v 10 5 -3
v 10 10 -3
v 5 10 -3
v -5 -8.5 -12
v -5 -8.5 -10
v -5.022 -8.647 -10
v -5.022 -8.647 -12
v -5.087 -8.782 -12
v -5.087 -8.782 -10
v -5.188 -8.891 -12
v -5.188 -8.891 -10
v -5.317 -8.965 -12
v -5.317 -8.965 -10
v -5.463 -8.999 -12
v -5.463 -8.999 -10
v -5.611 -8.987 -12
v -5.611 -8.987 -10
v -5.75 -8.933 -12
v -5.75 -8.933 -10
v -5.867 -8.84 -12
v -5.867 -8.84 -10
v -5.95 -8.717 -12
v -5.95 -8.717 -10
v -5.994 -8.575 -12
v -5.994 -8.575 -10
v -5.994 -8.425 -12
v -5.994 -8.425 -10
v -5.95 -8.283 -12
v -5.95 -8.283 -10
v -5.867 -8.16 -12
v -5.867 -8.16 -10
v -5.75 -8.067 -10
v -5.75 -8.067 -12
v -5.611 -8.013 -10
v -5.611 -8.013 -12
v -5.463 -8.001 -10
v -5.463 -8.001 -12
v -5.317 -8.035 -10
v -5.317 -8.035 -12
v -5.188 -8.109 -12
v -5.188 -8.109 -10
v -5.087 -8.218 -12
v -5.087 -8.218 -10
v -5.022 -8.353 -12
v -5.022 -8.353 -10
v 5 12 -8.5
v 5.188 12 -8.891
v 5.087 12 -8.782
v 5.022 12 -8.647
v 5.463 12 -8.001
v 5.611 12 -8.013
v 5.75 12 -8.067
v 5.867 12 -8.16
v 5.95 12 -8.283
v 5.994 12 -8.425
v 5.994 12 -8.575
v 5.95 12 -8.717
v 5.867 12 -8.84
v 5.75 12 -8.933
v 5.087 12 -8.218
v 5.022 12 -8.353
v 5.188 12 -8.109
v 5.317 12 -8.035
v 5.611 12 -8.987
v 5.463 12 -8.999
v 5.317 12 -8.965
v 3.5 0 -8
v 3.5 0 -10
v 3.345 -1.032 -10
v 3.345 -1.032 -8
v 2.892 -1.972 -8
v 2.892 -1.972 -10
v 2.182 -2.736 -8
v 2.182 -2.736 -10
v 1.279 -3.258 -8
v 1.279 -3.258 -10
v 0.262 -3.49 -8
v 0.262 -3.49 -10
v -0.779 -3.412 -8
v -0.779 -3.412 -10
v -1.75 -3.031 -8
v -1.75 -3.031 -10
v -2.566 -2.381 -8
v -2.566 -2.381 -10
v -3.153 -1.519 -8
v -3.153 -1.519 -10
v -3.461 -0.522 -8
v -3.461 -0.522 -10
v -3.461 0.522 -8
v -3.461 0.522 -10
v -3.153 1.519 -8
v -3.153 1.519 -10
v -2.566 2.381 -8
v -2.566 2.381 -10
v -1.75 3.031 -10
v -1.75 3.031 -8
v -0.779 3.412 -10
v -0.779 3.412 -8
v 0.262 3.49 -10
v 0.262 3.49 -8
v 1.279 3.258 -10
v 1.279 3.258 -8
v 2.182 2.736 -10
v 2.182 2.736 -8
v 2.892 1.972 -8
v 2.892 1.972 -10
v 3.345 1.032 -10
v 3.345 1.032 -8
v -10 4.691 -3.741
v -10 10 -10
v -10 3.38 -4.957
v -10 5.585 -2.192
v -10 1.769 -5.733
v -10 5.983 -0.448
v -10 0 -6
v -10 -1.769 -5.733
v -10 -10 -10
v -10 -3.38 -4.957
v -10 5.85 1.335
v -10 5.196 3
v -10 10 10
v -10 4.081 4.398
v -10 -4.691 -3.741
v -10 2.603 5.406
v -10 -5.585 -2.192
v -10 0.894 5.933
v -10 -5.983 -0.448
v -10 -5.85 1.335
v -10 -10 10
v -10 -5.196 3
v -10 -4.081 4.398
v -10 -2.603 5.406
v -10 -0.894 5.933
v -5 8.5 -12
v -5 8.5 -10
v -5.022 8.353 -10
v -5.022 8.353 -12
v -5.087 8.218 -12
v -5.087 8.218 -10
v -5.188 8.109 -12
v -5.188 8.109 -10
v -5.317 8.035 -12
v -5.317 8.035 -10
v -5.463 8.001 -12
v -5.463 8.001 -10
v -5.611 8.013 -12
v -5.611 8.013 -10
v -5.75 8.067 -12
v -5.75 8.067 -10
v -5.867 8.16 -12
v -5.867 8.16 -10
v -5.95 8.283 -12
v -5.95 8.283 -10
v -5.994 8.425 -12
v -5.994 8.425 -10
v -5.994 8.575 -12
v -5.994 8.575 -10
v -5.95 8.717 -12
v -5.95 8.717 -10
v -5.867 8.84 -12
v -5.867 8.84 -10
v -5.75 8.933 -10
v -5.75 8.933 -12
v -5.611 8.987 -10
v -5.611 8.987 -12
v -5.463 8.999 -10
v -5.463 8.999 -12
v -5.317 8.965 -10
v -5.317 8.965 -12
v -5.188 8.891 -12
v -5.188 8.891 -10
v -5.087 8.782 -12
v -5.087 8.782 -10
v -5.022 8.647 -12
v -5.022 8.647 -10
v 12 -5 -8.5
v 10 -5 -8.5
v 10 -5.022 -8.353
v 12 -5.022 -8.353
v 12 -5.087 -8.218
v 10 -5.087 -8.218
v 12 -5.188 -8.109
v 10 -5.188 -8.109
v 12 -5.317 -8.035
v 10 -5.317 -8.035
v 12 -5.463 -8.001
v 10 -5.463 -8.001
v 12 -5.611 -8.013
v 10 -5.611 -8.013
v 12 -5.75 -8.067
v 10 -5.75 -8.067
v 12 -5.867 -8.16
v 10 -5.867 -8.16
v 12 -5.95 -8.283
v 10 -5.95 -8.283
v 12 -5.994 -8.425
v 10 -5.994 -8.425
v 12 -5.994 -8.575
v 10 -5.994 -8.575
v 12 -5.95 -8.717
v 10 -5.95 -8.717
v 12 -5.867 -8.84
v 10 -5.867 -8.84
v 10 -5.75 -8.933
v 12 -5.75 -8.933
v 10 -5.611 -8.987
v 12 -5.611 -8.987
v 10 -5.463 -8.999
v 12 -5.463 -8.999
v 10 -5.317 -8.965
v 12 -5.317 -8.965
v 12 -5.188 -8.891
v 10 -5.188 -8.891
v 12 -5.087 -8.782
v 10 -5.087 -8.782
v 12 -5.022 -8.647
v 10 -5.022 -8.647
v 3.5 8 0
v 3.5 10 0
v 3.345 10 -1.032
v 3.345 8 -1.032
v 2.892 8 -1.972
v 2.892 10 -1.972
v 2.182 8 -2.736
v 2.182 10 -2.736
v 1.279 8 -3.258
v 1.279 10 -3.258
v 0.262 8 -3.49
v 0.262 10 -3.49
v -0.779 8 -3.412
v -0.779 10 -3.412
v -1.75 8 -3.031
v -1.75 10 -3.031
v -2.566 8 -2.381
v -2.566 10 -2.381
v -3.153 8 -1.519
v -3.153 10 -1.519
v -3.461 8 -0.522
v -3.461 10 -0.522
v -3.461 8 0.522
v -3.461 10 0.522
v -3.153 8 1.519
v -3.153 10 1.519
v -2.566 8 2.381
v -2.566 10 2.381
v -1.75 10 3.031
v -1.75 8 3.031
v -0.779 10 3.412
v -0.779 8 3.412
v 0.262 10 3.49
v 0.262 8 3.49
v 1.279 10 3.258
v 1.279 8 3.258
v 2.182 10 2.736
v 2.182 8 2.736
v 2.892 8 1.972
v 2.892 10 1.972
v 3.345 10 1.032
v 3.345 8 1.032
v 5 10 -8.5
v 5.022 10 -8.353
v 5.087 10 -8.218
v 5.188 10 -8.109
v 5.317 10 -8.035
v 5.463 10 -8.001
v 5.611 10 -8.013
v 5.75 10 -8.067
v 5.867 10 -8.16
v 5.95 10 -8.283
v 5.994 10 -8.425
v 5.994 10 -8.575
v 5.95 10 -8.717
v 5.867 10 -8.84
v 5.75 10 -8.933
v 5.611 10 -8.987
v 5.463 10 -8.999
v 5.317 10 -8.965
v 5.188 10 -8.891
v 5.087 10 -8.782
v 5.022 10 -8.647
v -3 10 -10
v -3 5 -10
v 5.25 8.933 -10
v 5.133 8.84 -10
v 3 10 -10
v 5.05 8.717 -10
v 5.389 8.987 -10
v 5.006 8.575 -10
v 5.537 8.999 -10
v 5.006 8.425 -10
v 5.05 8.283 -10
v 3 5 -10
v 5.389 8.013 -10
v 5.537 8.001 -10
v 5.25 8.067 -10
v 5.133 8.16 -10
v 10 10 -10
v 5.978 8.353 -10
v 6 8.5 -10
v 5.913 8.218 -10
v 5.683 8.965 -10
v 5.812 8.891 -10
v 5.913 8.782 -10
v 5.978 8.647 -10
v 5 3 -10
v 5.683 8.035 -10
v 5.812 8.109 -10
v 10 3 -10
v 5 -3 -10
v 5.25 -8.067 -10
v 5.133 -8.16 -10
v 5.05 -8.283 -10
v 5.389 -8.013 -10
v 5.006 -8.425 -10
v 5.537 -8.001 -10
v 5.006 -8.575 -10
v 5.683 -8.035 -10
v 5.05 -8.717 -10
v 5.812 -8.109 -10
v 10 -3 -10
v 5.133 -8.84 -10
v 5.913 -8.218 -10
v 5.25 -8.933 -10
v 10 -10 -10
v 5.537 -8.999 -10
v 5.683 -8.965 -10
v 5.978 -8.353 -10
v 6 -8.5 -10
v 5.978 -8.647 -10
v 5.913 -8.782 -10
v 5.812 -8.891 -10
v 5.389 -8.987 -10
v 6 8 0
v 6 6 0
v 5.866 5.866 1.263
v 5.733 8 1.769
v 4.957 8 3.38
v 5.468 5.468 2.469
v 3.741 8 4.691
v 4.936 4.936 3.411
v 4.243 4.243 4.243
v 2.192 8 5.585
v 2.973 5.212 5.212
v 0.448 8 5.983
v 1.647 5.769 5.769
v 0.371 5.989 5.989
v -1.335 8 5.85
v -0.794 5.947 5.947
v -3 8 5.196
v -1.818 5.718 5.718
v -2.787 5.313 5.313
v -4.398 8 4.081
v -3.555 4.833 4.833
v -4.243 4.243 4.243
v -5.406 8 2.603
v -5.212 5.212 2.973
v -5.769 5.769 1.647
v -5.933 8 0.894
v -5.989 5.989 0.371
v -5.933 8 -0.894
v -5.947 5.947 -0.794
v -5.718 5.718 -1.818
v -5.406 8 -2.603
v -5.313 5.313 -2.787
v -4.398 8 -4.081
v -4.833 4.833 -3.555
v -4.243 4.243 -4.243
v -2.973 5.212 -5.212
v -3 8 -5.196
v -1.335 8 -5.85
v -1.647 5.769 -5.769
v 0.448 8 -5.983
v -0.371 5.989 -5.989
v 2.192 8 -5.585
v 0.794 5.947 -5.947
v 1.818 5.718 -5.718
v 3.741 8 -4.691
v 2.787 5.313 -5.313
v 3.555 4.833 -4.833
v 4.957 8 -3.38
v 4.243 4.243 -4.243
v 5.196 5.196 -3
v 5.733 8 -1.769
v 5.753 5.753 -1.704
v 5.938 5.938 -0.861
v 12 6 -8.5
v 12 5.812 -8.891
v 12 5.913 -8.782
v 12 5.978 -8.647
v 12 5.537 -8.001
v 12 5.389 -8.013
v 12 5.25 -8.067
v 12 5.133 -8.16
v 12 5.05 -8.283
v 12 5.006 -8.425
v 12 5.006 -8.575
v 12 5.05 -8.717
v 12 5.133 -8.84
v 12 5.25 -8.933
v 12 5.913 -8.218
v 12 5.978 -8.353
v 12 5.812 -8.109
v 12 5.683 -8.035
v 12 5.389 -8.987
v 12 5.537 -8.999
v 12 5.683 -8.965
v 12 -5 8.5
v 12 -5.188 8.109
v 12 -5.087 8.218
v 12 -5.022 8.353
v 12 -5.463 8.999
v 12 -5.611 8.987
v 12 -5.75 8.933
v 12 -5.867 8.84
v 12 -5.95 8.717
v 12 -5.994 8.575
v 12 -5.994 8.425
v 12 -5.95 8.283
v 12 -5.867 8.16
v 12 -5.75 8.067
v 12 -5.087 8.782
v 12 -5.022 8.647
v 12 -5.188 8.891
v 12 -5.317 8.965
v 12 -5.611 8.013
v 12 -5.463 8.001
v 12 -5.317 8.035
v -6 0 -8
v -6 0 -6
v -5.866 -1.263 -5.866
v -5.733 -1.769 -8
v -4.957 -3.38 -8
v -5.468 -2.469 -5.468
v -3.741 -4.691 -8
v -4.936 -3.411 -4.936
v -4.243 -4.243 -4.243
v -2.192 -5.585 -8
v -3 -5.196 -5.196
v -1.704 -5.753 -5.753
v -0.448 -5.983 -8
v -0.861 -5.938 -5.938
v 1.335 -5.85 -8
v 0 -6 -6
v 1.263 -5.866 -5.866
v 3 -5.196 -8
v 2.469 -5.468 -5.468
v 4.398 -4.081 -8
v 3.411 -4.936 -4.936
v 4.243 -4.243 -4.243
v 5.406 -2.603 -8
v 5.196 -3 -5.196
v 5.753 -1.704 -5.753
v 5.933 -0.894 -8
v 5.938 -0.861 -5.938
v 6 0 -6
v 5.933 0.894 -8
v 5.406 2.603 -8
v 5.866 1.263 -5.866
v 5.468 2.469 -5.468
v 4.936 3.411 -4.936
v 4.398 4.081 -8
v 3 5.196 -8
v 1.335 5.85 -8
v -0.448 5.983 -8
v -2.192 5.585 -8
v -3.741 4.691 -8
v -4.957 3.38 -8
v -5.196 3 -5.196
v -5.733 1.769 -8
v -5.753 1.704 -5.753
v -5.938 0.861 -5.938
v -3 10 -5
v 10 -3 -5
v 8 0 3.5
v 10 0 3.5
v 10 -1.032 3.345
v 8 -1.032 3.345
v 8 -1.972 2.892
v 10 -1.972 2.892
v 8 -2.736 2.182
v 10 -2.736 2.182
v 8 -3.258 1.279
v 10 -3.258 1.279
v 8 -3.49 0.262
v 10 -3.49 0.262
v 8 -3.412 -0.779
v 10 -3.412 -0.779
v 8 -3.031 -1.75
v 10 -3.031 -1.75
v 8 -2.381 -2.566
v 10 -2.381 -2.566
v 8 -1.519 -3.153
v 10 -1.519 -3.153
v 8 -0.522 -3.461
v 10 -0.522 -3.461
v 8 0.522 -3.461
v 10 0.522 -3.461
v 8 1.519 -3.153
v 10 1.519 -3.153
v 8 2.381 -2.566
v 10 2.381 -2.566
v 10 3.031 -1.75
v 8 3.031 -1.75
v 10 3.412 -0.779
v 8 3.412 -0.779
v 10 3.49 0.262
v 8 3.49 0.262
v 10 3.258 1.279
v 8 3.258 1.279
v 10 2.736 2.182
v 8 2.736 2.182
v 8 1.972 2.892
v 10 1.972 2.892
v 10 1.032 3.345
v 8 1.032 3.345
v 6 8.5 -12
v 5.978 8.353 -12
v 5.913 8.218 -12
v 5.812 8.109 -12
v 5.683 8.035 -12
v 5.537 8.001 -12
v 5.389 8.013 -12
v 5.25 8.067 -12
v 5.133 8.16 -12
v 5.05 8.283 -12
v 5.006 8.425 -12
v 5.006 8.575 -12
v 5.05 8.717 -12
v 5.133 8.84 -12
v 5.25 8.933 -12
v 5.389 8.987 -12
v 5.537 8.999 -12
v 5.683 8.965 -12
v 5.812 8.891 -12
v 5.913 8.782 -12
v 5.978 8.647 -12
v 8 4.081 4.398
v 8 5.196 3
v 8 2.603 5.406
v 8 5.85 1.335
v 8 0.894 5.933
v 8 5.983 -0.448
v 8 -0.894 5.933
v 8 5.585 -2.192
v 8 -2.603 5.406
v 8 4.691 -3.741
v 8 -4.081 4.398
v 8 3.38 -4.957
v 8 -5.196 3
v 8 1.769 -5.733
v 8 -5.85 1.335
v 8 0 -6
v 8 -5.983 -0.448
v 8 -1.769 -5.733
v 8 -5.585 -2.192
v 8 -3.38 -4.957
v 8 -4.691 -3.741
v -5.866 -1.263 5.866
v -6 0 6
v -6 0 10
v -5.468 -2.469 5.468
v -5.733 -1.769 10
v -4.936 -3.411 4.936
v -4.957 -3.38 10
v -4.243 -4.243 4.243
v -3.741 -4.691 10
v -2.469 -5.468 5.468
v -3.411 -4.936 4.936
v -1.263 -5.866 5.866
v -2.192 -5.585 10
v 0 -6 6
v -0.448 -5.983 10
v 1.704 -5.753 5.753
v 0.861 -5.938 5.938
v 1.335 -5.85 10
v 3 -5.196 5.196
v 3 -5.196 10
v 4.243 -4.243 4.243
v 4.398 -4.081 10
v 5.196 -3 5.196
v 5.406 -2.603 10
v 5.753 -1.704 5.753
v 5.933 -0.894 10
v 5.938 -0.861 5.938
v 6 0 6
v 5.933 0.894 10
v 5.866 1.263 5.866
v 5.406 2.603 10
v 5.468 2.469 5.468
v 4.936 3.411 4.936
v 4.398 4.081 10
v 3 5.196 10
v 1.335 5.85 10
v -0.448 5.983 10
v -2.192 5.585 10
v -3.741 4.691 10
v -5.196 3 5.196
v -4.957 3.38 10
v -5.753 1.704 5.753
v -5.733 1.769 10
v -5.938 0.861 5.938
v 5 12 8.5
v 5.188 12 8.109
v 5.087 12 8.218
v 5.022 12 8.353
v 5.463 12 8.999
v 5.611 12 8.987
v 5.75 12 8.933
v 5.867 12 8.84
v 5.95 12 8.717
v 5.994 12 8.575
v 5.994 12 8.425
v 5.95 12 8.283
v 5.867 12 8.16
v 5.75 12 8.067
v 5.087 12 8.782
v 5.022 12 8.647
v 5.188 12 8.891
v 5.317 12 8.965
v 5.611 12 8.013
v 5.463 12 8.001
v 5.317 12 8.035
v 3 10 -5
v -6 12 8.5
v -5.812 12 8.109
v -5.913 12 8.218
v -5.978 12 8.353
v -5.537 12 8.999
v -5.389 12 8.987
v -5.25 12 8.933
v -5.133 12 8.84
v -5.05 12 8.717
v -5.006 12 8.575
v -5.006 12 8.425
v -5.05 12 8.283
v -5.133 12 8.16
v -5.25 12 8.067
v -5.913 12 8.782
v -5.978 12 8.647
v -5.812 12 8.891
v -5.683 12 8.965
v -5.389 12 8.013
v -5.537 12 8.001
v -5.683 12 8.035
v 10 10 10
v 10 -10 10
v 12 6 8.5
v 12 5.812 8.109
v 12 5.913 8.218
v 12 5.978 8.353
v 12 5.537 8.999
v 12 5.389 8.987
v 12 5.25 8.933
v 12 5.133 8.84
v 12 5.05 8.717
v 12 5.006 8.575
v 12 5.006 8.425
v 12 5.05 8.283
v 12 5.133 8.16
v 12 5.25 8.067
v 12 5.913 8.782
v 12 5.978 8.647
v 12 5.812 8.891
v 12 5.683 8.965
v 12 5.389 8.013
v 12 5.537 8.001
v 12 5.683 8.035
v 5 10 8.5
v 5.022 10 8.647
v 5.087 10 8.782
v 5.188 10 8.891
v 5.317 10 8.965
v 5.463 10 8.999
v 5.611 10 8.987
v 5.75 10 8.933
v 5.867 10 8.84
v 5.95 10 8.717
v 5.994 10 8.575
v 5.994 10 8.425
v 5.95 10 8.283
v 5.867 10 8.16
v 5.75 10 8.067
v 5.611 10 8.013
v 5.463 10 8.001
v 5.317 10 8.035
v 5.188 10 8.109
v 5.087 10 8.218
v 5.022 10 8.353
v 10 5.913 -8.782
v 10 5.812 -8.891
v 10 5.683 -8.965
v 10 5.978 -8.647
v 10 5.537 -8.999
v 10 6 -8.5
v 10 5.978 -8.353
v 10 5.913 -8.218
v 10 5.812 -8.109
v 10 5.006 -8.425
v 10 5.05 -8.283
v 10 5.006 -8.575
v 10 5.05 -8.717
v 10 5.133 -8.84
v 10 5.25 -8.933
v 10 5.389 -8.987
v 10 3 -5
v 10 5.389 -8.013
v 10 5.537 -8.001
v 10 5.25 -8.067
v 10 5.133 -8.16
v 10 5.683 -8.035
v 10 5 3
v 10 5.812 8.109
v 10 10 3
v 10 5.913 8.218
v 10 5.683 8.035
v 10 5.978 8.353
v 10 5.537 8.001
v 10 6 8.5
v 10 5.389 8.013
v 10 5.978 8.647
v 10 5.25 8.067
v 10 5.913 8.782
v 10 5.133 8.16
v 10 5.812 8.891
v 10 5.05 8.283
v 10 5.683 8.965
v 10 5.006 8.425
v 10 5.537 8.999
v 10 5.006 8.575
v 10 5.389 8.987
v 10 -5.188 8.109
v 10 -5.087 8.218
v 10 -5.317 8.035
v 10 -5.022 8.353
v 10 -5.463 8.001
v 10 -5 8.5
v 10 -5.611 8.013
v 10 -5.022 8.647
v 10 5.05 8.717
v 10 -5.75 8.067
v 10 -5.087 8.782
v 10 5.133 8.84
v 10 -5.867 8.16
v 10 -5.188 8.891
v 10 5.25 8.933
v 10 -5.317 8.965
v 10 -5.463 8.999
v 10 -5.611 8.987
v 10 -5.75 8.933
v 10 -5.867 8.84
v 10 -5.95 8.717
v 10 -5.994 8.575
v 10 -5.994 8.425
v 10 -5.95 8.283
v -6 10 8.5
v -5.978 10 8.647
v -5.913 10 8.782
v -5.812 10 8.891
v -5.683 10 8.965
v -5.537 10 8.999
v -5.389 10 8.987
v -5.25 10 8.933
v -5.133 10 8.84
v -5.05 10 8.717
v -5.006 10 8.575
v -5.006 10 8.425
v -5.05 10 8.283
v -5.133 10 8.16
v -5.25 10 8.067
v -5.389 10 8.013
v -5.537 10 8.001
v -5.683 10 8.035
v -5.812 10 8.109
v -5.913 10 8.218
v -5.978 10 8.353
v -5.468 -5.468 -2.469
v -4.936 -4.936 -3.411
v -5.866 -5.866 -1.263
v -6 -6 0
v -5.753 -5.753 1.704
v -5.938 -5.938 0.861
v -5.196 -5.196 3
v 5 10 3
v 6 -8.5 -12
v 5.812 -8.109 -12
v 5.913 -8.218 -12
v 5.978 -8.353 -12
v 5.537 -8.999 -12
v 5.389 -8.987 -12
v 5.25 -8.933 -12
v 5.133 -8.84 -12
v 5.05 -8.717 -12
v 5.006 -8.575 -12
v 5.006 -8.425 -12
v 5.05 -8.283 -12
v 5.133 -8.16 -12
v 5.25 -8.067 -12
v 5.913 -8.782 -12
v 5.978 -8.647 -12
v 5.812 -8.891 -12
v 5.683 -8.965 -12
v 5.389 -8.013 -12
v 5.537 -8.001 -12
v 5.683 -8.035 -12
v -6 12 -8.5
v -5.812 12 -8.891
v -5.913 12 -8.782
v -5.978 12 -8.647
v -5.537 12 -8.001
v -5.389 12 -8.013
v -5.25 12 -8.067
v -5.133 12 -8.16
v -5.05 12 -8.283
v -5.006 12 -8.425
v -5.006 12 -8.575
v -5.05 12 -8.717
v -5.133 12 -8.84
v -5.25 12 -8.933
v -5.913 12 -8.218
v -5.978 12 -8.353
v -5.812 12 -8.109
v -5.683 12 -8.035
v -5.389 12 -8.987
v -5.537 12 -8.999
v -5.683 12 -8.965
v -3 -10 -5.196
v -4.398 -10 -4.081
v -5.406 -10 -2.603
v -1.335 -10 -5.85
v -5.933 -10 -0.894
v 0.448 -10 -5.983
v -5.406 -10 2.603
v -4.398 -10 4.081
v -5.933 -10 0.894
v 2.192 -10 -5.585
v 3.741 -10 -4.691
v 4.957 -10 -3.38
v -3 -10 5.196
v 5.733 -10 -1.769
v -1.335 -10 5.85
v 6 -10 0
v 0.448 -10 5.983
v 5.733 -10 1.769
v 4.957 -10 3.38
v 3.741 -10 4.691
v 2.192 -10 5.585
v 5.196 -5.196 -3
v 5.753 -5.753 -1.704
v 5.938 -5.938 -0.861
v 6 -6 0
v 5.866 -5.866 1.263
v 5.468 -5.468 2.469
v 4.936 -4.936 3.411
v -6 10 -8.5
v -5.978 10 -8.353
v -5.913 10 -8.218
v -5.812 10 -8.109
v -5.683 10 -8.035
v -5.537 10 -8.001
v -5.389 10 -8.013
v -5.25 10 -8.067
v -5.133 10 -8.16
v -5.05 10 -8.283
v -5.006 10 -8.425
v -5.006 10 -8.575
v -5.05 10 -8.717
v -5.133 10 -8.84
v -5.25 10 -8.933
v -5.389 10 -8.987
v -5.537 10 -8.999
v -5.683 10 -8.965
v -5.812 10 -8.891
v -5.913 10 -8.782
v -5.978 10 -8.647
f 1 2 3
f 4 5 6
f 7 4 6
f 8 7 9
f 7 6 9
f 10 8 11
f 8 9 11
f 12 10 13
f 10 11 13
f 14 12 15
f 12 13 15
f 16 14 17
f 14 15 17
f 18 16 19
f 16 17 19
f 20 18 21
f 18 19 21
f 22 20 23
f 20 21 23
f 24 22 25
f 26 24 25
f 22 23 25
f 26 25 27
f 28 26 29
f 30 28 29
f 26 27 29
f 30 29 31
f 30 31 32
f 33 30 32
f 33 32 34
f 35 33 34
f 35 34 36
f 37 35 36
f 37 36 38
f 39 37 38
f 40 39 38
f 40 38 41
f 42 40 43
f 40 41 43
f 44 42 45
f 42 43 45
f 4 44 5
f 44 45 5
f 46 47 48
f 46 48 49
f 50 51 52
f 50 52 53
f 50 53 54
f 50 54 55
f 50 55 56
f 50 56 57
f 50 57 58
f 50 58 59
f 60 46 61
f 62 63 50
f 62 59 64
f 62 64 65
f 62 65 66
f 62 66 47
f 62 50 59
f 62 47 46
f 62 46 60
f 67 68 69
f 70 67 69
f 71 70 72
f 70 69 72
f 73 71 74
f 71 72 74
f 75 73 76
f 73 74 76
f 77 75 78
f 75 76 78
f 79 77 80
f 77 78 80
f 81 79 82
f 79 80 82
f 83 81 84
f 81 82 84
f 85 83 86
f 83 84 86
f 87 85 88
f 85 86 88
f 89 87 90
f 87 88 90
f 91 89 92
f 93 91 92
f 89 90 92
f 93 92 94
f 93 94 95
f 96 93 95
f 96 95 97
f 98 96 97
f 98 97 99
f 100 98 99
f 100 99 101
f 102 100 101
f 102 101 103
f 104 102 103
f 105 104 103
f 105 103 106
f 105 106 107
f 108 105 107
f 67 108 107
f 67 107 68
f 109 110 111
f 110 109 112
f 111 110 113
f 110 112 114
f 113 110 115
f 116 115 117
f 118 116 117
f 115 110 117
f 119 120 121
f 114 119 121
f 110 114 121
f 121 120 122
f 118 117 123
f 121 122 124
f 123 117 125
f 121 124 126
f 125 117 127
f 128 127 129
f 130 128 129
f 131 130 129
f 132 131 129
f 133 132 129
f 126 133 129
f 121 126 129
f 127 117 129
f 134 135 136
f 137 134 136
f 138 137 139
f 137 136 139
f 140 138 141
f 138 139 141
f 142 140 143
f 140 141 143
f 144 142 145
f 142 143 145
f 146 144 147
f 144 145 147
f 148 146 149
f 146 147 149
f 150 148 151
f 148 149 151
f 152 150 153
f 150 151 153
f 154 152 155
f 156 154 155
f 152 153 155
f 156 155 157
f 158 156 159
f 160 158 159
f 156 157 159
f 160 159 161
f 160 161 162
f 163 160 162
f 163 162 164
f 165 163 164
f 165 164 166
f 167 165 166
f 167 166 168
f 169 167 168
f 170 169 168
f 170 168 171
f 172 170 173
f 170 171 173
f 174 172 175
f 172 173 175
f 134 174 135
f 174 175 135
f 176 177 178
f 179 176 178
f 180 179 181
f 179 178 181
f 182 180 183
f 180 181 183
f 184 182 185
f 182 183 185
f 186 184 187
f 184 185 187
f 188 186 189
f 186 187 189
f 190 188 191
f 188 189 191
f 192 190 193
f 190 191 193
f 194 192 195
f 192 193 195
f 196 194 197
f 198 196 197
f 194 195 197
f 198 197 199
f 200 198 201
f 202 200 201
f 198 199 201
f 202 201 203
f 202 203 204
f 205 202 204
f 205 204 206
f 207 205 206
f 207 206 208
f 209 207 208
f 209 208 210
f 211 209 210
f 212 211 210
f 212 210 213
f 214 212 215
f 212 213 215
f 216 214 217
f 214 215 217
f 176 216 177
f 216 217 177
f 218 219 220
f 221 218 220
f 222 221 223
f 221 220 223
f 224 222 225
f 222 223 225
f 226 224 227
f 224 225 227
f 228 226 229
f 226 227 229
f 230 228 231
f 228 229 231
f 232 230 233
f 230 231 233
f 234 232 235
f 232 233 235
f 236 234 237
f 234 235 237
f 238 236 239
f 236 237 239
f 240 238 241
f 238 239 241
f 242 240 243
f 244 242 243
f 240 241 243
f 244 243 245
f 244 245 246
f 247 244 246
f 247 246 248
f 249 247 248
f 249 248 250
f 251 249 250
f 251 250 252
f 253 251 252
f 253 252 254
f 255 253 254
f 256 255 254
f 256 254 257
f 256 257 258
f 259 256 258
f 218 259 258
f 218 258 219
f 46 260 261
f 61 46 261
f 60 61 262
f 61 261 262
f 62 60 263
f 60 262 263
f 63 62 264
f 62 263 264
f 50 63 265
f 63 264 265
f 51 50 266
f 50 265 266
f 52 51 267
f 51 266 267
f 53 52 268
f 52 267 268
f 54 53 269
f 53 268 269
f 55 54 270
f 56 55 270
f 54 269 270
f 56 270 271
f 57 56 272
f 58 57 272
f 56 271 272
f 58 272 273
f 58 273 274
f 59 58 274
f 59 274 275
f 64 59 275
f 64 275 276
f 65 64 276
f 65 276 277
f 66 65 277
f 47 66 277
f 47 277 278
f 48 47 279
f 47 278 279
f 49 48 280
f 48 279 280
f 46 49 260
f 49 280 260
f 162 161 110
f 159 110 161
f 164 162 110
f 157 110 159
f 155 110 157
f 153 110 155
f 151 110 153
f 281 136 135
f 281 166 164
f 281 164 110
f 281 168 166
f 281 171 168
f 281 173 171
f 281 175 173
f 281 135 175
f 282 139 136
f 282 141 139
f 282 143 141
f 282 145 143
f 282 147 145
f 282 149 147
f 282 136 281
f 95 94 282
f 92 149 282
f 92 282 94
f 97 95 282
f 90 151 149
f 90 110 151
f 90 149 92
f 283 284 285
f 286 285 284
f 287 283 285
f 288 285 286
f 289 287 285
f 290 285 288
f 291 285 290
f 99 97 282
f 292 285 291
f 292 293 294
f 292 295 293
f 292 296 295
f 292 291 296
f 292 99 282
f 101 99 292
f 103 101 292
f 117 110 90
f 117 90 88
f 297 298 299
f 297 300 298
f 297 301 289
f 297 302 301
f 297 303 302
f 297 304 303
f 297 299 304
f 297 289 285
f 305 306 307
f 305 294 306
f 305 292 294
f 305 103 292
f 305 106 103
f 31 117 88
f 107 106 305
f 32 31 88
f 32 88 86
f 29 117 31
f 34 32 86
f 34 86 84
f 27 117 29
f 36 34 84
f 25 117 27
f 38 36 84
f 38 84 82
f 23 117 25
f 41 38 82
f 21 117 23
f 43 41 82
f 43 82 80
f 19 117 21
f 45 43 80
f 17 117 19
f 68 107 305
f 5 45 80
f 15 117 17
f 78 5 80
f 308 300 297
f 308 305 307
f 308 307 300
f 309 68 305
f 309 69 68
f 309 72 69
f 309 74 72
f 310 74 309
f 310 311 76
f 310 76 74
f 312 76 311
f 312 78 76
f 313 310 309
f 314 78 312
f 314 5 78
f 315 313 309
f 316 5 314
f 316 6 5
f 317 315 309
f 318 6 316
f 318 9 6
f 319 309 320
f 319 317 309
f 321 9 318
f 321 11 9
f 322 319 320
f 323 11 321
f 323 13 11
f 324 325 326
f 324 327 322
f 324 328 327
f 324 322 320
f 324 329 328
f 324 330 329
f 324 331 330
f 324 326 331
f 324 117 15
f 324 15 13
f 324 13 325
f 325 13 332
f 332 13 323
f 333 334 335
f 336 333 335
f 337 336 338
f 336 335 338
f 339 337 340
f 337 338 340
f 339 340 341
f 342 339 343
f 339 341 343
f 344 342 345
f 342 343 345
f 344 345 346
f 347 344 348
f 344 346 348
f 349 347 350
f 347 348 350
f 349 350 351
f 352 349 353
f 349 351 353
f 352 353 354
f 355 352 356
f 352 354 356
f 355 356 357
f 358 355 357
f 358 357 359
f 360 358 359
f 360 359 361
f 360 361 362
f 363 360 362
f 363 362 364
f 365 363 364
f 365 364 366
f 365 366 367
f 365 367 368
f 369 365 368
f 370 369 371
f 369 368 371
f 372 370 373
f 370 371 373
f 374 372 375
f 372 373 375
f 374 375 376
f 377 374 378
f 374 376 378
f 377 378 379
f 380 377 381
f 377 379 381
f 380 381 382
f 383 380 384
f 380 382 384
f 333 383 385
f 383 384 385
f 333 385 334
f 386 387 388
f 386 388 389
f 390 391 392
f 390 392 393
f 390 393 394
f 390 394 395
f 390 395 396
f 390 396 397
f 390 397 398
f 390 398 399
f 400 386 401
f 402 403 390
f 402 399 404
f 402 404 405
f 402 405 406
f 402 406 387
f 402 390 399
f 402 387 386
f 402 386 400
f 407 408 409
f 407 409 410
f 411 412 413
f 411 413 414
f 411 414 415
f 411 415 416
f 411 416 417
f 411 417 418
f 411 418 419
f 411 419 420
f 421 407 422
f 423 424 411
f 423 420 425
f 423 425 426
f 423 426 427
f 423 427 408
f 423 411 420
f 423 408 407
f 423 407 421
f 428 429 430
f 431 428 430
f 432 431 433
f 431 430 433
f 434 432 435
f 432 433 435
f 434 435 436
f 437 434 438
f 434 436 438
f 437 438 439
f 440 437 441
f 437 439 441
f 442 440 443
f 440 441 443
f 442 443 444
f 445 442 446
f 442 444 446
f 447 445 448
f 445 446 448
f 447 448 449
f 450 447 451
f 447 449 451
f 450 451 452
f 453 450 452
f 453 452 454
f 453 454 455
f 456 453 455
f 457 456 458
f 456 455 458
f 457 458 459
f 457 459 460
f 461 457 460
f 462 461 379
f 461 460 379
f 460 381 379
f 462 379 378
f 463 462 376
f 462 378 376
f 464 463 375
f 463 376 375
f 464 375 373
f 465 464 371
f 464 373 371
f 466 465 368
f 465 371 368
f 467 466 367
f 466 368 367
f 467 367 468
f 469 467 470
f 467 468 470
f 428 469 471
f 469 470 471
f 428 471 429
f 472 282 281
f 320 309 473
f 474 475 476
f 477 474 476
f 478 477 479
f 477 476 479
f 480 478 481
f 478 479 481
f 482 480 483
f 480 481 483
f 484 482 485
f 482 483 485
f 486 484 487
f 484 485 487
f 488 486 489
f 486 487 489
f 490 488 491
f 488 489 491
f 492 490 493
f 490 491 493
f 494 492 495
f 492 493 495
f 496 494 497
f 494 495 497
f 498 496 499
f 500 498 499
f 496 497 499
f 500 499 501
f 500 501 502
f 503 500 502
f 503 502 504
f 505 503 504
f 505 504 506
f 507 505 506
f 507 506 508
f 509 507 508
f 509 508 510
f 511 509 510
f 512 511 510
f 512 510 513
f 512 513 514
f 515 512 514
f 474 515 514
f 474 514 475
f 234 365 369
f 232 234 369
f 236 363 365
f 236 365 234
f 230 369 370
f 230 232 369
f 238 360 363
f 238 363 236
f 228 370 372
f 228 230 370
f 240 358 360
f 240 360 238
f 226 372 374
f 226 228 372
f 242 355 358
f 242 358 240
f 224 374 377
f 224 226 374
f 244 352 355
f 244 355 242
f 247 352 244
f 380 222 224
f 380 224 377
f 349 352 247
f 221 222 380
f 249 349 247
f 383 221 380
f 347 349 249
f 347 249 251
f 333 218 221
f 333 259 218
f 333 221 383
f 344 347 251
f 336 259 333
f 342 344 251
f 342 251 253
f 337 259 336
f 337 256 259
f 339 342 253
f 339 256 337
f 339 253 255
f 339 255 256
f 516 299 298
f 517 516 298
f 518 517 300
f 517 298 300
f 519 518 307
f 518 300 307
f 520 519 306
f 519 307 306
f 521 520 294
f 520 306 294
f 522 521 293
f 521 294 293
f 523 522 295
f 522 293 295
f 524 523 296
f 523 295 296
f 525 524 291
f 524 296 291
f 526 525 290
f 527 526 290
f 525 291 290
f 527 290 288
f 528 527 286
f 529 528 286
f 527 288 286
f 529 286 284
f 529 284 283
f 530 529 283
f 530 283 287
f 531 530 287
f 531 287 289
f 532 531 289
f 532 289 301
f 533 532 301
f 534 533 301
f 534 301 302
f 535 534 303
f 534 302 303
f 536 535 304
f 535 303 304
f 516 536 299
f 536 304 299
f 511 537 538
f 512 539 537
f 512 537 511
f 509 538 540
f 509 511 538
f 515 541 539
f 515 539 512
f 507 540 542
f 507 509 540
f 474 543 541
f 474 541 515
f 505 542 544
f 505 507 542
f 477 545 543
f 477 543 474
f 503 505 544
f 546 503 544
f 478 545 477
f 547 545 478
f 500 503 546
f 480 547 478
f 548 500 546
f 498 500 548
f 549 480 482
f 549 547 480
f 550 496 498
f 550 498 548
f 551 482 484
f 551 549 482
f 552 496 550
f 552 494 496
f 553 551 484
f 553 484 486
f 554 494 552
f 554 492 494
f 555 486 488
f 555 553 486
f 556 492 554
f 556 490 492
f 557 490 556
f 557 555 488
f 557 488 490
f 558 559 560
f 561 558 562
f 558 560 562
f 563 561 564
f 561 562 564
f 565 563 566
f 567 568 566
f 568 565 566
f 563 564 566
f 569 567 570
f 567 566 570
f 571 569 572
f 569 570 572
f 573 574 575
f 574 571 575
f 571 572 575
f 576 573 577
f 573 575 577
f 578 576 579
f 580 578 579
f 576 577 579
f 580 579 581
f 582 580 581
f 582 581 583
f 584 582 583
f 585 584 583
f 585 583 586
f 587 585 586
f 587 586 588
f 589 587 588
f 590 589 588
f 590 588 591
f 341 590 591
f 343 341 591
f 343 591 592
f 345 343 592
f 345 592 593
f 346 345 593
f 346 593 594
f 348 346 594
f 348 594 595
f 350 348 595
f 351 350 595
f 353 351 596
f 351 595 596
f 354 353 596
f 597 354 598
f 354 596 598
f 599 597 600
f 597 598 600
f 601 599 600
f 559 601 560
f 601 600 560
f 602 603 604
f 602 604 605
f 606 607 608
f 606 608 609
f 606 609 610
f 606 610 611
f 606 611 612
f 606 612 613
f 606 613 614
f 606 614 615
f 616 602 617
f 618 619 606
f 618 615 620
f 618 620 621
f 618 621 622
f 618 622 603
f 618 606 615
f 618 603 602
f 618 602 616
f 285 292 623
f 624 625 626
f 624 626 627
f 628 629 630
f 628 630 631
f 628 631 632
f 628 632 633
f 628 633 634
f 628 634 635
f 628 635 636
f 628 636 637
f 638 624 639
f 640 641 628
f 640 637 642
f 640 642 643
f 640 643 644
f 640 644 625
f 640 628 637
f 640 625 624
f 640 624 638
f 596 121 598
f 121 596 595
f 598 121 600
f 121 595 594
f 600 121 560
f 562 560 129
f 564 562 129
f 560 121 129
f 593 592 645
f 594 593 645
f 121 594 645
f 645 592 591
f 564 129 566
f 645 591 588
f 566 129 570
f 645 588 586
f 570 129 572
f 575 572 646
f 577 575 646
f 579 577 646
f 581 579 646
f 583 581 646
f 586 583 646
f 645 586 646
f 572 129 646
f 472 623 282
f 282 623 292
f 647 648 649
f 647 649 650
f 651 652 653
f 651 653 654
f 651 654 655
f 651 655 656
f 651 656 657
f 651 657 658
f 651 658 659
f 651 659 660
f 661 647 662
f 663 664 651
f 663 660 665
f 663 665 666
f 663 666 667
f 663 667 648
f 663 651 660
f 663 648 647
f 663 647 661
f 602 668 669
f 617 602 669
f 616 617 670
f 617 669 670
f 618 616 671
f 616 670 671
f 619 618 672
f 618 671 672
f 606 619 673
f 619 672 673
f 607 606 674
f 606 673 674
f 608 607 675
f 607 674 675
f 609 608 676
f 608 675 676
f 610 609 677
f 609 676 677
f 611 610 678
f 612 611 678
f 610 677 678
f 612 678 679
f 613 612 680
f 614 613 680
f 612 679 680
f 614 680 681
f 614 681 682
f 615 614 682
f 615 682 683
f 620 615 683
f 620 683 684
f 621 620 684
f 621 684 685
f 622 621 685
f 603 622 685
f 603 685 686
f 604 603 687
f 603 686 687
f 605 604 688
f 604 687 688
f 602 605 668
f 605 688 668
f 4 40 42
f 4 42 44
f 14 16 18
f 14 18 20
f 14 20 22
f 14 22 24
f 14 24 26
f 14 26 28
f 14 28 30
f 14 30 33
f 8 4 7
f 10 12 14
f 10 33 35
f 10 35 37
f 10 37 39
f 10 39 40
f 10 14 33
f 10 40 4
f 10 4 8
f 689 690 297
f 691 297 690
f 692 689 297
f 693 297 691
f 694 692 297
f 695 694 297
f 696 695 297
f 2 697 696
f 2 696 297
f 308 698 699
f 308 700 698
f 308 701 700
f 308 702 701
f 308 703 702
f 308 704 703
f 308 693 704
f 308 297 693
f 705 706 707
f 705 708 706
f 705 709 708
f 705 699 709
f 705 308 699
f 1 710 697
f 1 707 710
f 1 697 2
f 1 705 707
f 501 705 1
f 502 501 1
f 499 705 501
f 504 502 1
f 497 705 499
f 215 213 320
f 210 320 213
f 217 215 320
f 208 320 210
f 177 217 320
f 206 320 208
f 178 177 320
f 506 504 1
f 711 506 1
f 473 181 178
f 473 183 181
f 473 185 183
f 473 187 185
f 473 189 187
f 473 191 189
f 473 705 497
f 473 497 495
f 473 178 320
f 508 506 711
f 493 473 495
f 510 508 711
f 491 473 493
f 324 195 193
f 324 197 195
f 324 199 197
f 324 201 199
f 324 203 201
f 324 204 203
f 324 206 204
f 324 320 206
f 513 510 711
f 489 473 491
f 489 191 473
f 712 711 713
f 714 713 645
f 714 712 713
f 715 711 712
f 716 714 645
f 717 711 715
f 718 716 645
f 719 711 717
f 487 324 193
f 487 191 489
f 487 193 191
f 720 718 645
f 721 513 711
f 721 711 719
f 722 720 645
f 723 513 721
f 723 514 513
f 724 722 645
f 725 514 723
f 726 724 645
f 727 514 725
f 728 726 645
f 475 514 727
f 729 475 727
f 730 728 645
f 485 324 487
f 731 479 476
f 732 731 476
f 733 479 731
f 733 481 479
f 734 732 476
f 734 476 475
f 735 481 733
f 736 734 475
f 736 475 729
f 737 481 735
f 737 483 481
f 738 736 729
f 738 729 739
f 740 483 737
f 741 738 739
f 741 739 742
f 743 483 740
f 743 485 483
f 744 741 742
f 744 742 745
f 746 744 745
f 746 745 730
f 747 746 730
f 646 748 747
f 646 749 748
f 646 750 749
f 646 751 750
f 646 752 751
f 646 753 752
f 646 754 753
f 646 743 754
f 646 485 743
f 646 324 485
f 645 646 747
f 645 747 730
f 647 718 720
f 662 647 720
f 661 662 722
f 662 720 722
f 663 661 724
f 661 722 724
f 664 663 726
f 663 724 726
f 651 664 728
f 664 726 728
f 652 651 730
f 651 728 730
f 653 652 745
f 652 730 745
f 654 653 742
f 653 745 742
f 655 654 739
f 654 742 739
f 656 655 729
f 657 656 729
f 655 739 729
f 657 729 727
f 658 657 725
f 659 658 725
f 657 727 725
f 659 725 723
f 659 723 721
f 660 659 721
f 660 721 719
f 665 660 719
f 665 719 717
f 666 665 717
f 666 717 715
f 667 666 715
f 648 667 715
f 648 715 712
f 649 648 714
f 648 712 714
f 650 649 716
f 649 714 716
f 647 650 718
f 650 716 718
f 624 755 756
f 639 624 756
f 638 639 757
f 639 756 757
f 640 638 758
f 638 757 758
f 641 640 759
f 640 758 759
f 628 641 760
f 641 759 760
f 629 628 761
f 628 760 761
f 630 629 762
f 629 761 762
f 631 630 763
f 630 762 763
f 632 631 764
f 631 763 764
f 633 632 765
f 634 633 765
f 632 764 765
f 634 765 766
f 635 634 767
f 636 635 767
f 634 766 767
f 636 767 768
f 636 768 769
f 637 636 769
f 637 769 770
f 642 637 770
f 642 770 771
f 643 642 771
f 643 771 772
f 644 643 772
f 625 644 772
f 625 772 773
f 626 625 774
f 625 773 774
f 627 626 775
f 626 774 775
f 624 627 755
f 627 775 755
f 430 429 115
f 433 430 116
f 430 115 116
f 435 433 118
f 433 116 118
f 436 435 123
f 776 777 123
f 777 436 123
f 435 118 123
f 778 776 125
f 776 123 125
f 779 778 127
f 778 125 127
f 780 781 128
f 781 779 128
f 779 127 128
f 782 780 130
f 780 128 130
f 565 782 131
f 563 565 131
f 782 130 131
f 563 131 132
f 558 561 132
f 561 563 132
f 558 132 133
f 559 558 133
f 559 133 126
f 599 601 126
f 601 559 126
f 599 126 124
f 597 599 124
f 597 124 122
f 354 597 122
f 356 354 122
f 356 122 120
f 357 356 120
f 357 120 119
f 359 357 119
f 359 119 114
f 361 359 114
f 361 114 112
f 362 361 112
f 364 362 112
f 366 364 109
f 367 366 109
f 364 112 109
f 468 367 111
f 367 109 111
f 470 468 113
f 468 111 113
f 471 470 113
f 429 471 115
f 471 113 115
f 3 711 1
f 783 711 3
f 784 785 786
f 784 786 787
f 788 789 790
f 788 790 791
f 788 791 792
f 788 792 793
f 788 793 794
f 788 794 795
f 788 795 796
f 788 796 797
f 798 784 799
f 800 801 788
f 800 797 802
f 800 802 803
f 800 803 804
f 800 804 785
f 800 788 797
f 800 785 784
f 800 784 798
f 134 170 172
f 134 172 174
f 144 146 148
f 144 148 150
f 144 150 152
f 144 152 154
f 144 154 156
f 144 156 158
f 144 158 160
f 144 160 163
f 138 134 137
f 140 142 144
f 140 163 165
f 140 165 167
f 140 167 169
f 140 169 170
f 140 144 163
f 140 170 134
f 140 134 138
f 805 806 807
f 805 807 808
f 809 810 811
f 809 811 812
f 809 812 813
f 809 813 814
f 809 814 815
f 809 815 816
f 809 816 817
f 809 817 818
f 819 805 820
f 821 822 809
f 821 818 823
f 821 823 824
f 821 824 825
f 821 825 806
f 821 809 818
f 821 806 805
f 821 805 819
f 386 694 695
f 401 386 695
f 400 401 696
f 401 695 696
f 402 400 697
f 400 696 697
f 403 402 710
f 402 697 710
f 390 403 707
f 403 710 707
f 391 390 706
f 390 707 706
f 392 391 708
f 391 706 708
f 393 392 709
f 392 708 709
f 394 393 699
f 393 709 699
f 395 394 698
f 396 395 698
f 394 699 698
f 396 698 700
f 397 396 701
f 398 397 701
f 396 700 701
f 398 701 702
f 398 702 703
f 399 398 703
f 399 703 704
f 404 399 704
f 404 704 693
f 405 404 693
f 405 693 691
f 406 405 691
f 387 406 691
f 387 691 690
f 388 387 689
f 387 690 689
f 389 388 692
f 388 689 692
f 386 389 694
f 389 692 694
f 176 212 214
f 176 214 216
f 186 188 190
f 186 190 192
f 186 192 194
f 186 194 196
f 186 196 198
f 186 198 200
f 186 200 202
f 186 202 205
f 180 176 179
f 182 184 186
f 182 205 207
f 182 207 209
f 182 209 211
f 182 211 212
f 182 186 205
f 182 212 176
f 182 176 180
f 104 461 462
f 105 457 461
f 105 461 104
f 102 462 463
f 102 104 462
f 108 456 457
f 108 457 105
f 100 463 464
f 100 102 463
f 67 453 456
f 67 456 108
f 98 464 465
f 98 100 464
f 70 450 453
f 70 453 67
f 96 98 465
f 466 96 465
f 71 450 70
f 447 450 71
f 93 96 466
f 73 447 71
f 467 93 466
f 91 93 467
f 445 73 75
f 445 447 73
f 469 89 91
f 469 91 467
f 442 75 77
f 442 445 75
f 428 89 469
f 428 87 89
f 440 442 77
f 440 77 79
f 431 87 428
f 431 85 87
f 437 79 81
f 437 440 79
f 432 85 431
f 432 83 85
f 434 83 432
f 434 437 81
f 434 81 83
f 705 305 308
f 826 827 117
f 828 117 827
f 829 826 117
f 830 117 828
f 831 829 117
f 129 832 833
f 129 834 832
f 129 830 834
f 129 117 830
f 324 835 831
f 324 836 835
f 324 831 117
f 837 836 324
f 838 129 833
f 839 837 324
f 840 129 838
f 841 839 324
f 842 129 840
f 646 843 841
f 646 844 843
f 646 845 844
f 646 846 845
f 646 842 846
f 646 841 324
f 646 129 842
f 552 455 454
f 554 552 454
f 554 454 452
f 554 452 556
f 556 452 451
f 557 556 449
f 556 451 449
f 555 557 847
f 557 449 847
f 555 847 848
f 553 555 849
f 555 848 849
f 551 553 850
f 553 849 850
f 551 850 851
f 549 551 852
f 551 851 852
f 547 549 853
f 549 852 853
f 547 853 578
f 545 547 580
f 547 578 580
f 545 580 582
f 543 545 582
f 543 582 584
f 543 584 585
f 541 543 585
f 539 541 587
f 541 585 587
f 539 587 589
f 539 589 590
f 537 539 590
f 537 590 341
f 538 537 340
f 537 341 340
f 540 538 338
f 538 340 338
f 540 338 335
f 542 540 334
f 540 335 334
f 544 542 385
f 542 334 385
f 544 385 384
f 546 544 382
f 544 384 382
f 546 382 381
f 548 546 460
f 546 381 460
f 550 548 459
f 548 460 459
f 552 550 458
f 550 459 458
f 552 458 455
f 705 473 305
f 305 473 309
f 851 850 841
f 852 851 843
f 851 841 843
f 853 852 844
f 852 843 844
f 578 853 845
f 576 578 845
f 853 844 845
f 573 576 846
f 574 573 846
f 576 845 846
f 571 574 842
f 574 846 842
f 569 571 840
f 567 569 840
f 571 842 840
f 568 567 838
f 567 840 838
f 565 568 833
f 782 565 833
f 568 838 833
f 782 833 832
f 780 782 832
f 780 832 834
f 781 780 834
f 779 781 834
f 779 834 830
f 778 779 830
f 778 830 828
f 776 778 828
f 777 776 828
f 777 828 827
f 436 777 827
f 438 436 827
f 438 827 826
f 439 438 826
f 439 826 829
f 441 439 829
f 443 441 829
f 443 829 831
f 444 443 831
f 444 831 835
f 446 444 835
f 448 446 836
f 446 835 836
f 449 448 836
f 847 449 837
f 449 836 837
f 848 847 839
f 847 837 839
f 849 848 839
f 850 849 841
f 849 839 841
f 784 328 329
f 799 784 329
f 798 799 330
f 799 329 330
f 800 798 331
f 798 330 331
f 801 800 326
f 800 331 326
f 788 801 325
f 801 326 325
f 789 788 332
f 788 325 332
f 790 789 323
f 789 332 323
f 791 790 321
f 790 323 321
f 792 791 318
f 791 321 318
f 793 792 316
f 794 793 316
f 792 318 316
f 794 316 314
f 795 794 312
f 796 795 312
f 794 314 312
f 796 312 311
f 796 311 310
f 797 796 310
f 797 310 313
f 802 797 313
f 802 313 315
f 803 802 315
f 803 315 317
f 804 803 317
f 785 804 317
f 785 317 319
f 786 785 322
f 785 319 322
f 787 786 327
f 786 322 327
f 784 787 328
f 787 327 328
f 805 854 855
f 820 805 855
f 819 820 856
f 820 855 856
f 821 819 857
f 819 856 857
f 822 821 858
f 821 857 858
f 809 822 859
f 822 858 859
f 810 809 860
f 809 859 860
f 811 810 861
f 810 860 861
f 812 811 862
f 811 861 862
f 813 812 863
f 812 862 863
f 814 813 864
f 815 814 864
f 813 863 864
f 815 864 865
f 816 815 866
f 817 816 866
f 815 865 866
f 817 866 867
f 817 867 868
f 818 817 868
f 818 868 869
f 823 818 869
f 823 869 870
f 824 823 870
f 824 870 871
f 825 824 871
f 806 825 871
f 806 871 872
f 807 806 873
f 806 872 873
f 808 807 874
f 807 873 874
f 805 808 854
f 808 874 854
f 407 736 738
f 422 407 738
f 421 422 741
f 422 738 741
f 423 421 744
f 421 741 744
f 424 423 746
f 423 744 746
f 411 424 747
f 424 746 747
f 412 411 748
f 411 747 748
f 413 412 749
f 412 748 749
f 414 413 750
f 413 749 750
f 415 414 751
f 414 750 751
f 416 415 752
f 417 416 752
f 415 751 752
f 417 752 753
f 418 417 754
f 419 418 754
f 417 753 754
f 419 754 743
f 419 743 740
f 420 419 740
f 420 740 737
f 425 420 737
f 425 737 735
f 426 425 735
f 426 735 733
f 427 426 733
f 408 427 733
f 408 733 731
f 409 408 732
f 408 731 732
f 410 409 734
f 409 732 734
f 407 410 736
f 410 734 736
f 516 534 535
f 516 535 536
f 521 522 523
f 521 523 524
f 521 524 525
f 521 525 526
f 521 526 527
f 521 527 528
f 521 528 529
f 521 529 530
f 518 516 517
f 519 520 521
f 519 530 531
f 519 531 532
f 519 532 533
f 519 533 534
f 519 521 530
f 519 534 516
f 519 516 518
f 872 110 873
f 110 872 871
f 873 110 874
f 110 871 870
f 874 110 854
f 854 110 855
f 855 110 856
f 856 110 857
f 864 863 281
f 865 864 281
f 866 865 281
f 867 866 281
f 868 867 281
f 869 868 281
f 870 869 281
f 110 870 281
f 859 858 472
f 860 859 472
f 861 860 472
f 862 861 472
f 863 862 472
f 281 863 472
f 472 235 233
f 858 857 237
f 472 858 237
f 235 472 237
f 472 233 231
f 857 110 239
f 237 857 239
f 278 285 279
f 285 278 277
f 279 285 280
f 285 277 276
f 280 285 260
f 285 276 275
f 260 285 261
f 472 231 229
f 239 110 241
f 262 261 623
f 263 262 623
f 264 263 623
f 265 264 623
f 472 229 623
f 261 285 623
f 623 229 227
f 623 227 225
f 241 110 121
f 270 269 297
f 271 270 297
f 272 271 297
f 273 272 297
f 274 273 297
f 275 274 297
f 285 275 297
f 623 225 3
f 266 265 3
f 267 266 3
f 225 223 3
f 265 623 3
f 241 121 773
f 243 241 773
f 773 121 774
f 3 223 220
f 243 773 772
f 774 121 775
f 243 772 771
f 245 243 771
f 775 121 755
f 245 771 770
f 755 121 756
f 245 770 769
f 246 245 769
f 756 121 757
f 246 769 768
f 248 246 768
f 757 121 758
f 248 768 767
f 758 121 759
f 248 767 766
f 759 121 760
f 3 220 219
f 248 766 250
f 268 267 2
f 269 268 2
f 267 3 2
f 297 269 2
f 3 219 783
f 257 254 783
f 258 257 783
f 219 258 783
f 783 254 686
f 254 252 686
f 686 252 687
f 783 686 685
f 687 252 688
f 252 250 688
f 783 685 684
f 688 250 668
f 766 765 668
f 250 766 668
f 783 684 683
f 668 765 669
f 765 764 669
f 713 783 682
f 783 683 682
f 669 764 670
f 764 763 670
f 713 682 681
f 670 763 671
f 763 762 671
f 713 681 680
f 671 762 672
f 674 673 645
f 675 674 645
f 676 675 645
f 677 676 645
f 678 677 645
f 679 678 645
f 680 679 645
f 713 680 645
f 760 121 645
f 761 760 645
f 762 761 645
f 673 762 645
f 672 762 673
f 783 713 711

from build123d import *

# Parameters (mm, degrees)
PAD003_DEPTH    = 3
PAD002_DEPTH    = 3
PAD001_DEPTH    = 3
SKETCH_W        = 20
SKETCH_H        = 20
PAD_DEPTH       = 10
SKETCH001_R     = 6
POCKET_DEPTH    = 18
SKETCH003_R     = 6
POCKET001_DEPTH = 18
SKETCH004_R     = 6
POCKET002_DEPTH = 18
SKETCH005_R     = 3.5
POCKET003_DEPTH = 5
SKETCH006_R     = 3.5
POCKET004_DEPTH = 5
SKETCH007_R     = 3.5
POCKET005_DEPTH = 5
SKETCH011_R     = 0.5
PAD004_DEPTH    = 2
SKETCH012_R     = 0.5
PAD005_DEPTH    = 2
SKETCH013_R     = 0.5
PAD006_DEPTH    = 2


with BuildPart() as pad003:
    # Sketch010 → Pad003 (new body, symmetric)
    with BuildSketch(Plane.YZ):
        Polygon((5, -10), (10, -10), (10, -5), align=None)
    extrude(amount=PAD003_DEPTH, both=True)


with BuildPart() as pad002:
    # Sketch009 → Pad002 (new body, symmetric)
    with BuildSketch(Plane.XZ):
        Polygon((5, -10), (10, -10), (10, -5), align=None)
    extrude(amount=PAD002_DEPTH, both=True)


with BuildPart() as pad001:
    # Sketch008 → Pad001 (new body, symmetric)
    with BuildSketch(Plane.XY):
        Polygon((10, 5), (5, 10), (10, 10), align=None)
    extrude(amount=PAD001_DEPTH, both=True)


with BuildPart() as pad006:
    # Sketch → Pad (new body, symmetric)
    with BuildSketch(Plane.XZ):
        Rectangle(SKETCH_W, SKETCH_H)
    extrude(amount=PAD_DEPTH, both=True)

    # Sketch001 → Pocket (cut)
    with BuildSketch(Plane.XZ.offset(10)):
        Circle(SKETCH001_R)
    extrude(amount=-POCKET_DEPTH, mode=Mode.SUBTRACT)

    # Sketch003 → Pocket001 (cut)
    with BuildSketch(Plane(origin=(0, 0, 10), x_dir=(-1, 0, 0), z_dir=(0, 0, 1))):
        Circle(SKETCH003_R)
    extrude(amount=-POCKET001_DEPTH, mode=Mode.SUBTRACT)

    # Sketch004 → Pocket002 (cut)
    with BuildSketch(Plane(origin=(-10, 0, 0), x_dir=(0, 0, -1), z_dir=(-1, 0, 0))):
        Circle(SKETCH004_R)
    extrude(amount=-POCKET002_DEPTH, mode=Mode.SUBTRACT)

    # Sketch005 → Pocket003 (cut)
    with BuildSketch(Plane(origin=(0, 0, -10), x_dir=(1, 0, 0), z_dir=(0, 0, -1))):
        Circle(SKETCH005_R)
    extrude(amount=-POCKET003_DEPTH, mode=Mode.SUBTRACT)

    # Sketch006 → Pocket004 (cut)
    with BuildSketch(Plane(origin=(0, 10, 0), x_dir=(1, 0, 0), z_dir=(0, 1, 0))):
        Circle(SKETCH006_R)
    extrude(amount=-POCKET004_DEPTH, mode=Mode.SUBTRACT)

    # Sketch007 → Pocket005 (cut)
    with BuildSketch(Plane(origin=(10, 0, 0), x_dir=(0, 0, 1), z_dir=(1, 0, 0))):
        Circle(SKETCH007_R)
    extrude(amount=-POCKET005_DEPTH, mode=Mode.SUBTRACT)

    # Cut: cut Pad001
    add(pad001.part, mode=Mode.SUBTRACT)

    # Cut001: cut Pad002
    add(pad002.part, mode=Mode.SUBTRACT)

    # Cut002: cut Pad003
    add(pad003.part, mode=Mode.SUBTRACT)

    # Sketch011 → Pad004 (new body)
    with BuildSketch(Plane.YZ.offset(10)):
        with Locations((-5.5, 8.5)):
            Circle(SKETCH011_R)
        with Locations((5.5, 8.5)):
            Circle(SKETCH011_R)
        with Locations((-5.5, -8.5)):
            Circle(SKETCH011_R)
        with Locations((5.5, -8.5)):
            Circle(SKETCH011_R)
    extrude(amount=PAD004_DEPTH)

    # Sketch012 → Pad005 (new body)
    with BuildSketch(Plane(origin=(0, 10, 0), x_dir=(-1, 0, 0), z_dir=(0, 1, 0))):
        with Locations((-5.5, 8.5)):
            Circle(SKETCH012_R)
        with Locations((5.5, 8.5)):
            Circle(SKETCH012_R)
        with Locations((5.5, -8.5)):
            Circle(SKETCH012_R)
        with Locations((-5.5, -8.5)):
            Circle(SKETCH012_R)
    extrude(amount=PAD005_DEPTH)

    # Sketch013 → Pad006 (new body)
    with BuildSketch(Plane(origin=(0, 0, -10), x_dir=(1, 0, 0), z_dir=(0, 0, -1))):
        with Locations((-5.5, 8.5)):
            Circle(SKETCH013_R)
        with Locations((5.5, 8.5)):
            Circle(SKETCH013_R)
        with Locations((-5.5, -8.5)):
            Circle(SKETCH013_R)
        with Locations((5.5, -8.5)):
            Circle(SKETCH013_R)
    extrude(amount=PAD006_DEPTH)


solid = pad006.part
